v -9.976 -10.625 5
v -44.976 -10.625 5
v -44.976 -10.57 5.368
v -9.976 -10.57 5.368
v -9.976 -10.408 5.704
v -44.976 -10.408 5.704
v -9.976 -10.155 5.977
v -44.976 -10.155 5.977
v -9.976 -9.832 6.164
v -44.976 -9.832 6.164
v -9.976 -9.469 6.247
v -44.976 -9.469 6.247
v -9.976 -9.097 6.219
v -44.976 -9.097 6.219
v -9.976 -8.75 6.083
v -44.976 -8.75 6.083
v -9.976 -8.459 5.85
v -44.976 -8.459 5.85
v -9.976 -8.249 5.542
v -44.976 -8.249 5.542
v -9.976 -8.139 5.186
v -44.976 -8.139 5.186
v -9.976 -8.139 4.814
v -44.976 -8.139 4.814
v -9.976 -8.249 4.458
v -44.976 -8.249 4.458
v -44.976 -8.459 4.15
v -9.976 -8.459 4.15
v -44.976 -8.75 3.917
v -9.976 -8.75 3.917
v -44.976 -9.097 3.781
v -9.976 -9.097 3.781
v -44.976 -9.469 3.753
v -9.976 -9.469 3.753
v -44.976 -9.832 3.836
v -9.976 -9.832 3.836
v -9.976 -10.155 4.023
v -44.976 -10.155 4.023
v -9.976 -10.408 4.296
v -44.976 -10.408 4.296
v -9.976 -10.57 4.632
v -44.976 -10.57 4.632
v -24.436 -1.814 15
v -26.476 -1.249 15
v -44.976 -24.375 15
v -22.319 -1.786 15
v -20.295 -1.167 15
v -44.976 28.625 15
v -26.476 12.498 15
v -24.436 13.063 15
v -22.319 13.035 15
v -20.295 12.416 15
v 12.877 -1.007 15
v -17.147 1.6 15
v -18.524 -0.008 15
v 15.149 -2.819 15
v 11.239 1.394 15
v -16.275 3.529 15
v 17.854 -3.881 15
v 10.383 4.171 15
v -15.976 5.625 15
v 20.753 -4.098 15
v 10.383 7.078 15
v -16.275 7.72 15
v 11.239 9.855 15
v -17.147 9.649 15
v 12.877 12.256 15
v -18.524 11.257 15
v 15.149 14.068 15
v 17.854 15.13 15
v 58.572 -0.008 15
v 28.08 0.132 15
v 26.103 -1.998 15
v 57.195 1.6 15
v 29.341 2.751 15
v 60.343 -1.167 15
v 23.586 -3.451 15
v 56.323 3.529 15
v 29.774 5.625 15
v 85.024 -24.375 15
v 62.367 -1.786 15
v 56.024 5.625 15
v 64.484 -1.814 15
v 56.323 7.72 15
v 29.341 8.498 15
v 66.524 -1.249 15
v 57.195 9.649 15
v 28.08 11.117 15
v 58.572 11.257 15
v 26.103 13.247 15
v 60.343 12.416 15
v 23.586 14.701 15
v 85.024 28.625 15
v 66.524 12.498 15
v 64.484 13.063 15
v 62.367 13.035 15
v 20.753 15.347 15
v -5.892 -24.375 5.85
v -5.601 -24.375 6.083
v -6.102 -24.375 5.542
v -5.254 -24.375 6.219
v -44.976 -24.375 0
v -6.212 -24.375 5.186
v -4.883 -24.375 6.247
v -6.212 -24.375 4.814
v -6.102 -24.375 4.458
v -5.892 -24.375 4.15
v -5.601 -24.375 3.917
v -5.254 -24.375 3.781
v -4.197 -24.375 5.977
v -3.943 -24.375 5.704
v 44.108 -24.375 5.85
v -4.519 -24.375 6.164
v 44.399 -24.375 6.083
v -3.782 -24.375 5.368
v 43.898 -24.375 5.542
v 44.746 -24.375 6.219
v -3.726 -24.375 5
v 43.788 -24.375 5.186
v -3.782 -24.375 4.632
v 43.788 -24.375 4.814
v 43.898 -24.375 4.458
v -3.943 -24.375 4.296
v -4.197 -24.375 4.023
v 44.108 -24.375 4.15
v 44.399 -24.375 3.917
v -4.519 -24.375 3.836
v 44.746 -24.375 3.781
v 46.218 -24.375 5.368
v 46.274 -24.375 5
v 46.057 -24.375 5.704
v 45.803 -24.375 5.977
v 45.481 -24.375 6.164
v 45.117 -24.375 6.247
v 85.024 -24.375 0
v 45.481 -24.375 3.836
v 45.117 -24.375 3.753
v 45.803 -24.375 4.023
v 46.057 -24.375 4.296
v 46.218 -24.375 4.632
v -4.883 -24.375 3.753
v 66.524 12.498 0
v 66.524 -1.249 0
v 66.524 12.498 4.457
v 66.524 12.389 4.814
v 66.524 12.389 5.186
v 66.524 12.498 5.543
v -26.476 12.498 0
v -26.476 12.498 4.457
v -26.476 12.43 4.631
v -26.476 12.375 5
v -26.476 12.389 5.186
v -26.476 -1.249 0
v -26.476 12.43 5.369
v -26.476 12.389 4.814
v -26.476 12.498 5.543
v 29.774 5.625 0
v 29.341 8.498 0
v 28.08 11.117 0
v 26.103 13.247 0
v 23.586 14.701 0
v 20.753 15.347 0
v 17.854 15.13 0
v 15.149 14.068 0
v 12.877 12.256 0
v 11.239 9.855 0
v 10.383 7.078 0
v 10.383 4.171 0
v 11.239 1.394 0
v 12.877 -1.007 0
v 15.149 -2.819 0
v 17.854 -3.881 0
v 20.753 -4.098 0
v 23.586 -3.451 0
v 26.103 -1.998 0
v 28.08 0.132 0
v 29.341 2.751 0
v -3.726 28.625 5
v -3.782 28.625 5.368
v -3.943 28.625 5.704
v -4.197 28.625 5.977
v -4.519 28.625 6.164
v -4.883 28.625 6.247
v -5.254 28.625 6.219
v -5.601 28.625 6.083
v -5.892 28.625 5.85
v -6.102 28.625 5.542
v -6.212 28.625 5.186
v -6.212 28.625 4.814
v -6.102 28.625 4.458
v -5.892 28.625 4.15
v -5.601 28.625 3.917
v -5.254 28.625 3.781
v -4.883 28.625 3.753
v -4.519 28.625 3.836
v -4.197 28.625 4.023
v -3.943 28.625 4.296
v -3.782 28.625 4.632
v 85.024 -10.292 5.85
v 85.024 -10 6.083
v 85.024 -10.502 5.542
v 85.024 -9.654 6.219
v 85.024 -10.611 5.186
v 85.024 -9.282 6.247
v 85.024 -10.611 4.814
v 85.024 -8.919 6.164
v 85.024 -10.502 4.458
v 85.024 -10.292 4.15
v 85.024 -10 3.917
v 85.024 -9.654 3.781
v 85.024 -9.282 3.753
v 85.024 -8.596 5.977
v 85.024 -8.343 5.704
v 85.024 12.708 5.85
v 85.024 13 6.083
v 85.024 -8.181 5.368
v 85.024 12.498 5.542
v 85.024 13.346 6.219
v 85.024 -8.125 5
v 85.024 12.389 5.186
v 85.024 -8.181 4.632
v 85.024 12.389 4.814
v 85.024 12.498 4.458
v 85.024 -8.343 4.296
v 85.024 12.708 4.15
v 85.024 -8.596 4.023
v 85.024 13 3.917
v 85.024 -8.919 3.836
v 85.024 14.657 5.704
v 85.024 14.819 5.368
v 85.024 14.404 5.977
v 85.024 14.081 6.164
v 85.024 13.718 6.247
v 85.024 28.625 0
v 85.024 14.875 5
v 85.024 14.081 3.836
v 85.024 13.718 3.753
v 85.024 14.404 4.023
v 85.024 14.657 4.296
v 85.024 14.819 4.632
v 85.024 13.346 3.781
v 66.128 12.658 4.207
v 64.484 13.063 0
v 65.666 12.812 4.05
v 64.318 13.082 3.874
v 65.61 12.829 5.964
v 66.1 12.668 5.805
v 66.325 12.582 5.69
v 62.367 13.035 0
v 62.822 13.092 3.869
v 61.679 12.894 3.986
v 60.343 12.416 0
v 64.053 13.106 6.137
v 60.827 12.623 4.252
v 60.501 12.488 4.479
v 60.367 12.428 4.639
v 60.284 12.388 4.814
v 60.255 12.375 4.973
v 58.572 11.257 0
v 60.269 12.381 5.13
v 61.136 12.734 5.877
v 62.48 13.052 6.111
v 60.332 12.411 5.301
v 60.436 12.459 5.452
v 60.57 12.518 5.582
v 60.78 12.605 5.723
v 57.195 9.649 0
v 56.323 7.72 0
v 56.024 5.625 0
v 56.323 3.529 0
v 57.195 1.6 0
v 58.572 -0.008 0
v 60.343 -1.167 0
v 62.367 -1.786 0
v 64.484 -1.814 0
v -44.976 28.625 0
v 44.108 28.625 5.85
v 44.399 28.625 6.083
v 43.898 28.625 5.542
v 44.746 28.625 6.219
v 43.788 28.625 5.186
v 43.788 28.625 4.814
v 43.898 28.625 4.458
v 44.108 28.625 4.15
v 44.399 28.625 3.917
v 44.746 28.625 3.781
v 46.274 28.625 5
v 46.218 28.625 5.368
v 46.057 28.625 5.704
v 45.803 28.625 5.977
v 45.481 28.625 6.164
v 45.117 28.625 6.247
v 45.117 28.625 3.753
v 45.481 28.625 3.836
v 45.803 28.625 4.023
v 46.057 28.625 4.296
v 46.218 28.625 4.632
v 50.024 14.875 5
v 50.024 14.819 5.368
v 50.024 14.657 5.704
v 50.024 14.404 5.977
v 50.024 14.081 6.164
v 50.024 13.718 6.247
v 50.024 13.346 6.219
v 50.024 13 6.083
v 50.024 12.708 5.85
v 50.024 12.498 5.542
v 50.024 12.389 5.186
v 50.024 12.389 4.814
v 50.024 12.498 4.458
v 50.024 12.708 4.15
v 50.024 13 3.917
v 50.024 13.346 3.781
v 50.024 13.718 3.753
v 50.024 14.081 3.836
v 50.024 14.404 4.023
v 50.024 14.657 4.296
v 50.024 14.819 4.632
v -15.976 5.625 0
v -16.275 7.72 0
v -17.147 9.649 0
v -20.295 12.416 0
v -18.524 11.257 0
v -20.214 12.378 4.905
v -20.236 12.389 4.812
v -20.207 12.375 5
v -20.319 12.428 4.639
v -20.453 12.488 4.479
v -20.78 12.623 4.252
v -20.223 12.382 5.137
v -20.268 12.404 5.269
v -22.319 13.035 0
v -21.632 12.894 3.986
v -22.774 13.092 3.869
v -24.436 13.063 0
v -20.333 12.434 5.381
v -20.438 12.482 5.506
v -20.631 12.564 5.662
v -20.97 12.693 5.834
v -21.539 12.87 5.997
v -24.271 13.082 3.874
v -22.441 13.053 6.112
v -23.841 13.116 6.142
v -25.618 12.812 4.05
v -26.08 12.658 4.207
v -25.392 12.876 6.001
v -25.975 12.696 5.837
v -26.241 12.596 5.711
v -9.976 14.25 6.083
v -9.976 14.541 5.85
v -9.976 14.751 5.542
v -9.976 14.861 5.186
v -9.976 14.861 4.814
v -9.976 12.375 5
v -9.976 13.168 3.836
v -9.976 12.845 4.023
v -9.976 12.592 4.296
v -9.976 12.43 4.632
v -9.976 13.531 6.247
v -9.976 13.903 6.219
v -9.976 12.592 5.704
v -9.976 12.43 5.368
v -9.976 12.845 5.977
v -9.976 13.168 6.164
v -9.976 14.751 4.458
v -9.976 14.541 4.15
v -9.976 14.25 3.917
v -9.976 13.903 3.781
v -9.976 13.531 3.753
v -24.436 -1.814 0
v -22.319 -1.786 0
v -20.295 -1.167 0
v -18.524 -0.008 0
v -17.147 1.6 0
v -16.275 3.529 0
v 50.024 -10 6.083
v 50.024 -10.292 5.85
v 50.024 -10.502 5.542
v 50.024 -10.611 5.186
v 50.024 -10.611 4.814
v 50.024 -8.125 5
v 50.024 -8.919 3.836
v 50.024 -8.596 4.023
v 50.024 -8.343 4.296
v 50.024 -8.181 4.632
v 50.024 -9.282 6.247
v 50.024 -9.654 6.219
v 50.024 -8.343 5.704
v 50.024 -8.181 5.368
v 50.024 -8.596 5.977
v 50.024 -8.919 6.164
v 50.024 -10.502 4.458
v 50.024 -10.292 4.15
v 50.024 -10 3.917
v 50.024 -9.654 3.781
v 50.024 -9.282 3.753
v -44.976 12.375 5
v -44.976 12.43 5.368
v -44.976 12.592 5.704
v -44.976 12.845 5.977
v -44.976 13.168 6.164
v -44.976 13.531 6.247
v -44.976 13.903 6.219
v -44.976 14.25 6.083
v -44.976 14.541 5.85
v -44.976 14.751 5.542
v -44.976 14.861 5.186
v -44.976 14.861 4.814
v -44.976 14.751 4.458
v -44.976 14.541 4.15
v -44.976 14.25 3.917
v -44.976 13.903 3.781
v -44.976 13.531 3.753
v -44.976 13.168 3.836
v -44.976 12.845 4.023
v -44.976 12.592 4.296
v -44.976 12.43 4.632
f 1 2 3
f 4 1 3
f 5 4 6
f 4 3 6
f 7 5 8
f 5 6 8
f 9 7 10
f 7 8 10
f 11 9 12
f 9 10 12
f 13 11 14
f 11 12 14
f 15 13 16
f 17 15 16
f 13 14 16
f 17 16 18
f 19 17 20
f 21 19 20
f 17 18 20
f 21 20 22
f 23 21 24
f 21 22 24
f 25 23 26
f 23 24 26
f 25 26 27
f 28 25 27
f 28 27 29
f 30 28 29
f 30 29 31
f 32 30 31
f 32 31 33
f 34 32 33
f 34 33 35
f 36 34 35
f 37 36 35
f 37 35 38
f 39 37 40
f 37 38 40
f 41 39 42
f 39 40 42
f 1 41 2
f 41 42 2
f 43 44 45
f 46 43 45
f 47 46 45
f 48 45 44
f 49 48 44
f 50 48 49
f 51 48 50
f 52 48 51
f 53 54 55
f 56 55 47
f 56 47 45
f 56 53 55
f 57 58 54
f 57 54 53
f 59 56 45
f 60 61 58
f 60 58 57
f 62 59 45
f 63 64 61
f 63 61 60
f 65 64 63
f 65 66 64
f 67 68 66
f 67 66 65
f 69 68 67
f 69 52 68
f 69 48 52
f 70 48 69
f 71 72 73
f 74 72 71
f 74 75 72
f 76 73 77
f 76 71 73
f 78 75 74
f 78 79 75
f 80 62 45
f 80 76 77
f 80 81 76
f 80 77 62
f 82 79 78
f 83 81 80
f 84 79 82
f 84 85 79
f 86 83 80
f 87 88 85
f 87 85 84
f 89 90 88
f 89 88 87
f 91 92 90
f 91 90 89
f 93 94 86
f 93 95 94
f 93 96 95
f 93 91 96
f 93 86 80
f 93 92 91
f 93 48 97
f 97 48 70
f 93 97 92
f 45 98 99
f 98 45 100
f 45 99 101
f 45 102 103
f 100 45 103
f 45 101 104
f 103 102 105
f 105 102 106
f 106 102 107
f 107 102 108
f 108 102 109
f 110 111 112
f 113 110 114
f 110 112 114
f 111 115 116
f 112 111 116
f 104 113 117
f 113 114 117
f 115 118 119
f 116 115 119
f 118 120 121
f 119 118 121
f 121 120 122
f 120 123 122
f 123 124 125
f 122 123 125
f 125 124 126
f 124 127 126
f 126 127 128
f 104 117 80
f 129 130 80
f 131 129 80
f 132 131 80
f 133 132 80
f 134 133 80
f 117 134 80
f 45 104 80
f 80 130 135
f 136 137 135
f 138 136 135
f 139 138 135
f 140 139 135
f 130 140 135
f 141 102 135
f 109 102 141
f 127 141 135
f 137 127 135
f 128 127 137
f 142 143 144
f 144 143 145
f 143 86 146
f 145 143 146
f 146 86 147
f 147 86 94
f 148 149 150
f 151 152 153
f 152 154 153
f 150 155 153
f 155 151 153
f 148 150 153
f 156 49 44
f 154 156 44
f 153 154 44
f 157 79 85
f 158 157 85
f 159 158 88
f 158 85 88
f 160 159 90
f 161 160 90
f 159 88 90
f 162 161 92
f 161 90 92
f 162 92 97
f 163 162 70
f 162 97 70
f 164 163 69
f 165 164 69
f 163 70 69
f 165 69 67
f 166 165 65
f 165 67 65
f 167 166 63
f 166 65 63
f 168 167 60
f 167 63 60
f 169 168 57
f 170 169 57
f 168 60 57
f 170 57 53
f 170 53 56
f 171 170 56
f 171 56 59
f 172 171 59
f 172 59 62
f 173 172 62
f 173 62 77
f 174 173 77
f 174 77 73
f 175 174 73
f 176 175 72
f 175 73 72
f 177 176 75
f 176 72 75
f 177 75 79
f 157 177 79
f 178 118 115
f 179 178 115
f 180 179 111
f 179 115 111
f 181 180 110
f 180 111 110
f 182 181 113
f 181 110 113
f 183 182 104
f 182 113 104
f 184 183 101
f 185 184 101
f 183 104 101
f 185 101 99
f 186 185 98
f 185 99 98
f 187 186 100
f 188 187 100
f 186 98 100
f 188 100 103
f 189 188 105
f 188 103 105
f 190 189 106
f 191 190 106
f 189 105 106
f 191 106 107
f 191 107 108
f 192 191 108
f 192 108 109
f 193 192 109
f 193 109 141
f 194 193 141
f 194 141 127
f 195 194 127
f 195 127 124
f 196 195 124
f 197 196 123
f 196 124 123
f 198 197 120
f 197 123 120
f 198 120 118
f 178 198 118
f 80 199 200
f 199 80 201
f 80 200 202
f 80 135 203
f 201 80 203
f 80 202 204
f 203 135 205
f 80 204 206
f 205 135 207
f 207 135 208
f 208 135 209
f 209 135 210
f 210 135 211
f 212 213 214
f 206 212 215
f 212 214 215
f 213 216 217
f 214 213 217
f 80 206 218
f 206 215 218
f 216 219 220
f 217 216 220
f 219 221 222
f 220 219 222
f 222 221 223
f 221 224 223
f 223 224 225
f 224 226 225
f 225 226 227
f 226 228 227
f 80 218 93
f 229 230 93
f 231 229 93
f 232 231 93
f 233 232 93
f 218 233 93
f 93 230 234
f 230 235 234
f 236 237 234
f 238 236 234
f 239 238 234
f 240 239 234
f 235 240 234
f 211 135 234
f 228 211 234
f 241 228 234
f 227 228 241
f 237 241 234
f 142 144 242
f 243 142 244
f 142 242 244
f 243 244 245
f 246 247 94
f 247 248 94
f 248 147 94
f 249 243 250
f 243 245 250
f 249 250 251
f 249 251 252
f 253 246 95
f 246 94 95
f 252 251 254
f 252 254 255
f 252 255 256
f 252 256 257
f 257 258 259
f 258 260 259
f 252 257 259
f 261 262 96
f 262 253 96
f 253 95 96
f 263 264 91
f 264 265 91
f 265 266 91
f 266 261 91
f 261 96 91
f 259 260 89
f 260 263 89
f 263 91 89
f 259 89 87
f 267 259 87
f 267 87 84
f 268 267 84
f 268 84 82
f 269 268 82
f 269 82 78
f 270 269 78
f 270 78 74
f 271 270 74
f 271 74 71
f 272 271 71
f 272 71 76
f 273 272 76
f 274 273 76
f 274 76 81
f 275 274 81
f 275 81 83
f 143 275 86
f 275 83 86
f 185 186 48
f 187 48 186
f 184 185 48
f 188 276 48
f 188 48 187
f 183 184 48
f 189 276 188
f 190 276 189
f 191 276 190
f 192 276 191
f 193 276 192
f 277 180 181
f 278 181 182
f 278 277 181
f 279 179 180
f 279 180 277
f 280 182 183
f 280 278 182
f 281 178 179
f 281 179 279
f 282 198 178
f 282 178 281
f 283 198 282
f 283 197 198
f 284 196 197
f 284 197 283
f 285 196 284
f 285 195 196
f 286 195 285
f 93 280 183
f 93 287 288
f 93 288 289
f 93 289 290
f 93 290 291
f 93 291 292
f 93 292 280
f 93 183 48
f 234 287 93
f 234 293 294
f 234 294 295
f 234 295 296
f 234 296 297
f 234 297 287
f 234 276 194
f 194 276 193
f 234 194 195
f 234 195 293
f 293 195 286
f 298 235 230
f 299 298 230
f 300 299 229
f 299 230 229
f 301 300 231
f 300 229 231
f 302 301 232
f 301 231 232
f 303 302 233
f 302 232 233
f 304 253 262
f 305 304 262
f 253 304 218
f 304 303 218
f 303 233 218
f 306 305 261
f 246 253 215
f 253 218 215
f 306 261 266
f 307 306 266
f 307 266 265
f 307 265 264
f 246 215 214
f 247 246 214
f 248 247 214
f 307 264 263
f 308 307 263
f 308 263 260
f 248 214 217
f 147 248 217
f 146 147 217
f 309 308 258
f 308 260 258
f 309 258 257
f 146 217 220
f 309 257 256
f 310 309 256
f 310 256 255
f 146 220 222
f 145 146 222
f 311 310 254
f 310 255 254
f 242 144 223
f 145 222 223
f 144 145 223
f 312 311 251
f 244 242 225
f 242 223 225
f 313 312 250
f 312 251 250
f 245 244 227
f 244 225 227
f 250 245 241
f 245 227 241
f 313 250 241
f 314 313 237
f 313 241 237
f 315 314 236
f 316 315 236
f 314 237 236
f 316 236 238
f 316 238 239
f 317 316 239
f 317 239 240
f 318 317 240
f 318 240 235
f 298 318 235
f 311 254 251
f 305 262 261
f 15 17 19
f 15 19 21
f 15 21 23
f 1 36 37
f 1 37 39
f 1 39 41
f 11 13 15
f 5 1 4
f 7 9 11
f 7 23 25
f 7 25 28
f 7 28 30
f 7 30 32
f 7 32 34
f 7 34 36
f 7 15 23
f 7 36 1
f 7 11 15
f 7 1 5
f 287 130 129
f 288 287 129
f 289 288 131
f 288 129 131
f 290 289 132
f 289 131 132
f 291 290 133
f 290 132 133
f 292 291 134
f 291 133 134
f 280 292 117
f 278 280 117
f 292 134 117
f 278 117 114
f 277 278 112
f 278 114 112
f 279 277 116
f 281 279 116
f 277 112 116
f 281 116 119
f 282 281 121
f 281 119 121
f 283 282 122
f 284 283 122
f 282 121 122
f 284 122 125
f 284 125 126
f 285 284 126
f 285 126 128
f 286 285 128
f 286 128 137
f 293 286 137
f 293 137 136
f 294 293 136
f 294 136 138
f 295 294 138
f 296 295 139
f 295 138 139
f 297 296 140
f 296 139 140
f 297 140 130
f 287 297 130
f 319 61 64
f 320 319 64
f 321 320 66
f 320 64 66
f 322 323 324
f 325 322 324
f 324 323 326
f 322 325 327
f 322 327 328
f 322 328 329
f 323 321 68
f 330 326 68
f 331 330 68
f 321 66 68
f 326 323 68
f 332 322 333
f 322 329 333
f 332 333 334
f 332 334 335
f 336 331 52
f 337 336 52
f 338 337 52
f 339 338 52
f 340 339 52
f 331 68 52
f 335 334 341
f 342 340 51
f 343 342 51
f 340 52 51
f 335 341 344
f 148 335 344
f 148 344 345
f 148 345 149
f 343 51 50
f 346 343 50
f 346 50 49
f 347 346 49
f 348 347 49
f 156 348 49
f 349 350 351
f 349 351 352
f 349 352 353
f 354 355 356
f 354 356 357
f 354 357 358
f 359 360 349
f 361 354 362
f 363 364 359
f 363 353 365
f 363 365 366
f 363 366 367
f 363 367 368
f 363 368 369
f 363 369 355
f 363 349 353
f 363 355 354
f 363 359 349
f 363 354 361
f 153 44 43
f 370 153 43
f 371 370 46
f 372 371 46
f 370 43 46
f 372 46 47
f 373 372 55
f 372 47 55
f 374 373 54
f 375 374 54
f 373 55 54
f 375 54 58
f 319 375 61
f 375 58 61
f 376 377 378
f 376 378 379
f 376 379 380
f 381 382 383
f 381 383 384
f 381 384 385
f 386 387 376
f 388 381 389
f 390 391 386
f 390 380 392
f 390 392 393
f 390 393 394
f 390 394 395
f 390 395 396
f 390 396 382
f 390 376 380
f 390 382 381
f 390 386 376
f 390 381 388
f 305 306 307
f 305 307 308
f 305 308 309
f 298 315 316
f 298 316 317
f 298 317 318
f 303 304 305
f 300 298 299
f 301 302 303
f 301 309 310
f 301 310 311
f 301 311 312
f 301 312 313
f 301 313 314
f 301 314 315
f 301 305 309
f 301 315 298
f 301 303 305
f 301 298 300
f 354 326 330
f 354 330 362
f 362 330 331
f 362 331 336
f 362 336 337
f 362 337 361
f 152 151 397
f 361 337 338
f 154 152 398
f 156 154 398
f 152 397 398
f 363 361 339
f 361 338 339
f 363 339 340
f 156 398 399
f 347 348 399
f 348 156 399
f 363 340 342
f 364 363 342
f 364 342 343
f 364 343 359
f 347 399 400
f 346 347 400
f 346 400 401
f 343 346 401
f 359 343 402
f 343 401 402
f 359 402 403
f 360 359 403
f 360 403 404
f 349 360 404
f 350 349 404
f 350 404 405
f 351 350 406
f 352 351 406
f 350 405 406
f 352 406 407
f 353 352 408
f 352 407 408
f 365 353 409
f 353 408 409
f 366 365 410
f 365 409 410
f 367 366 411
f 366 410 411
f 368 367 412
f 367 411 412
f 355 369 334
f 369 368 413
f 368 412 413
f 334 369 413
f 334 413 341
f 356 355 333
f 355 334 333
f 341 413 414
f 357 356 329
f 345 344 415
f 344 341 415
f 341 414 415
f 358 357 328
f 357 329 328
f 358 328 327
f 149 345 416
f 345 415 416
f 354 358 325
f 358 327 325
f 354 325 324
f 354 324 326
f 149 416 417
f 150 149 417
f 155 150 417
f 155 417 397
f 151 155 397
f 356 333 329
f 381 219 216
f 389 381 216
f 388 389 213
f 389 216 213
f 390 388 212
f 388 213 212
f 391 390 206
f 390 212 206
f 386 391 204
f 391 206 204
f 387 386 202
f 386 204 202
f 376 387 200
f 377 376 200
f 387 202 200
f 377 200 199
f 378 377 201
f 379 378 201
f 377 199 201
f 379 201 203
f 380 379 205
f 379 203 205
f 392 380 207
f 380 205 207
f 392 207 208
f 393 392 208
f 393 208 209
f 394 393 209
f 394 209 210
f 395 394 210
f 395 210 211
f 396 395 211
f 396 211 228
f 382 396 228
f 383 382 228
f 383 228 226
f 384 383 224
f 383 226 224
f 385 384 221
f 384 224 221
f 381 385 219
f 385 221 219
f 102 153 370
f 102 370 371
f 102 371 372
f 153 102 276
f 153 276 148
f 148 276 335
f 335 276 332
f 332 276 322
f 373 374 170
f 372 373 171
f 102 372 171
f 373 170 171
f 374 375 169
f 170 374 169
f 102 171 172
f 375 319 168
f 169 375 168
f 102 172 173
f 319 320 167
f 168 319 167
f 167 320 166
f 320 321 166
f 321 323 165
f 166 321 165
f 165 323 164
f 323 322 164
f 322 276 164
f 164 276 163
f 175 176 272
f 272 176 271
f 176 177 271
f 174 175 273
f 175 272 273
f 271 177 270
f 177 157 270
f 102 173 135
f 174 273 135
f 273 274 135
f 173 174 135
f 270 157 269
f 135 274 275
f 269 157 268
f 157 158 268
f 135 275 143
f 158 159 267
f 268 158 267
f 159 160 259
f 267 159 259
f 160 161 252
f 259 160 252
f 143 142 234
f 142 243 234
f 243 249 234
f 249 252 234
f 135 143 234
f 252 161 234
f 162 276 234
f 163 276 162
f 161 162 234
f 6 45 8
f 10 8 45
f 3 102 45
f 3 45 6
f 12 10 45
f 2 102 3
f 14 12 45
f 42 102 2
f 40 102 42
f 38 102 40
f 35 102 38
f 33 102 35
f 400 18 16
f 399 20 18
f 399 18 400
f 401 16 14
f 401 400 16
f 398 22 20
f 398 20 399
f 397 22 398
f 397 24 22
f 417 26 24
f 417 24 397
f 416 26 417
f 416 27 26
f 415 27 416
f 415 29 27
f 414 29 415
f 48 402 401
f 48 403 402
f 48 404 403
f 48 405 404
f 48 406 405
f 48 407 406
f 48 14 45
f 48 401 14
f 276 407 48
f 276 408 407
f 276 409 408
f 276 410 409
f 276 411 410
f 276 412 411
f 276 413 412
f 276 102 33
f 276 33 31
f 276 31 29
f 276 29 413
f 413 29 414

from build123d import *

# Parameters (mm, degrees)
F0_W      = 130
F0_H      = 53
F1_DEPTH  = 15
F2_R      = 1.25
F5_DEPTH  = 35
F3_R      = 1.25
F6_DEPTH  = 53
F4_R      = 1.25
F7_DEPTH  = 35
F9_DEPTH  = 15
F10_R     = 9.75
F11_DEPTH = 15


with BuildPart() as f1:
    # F0 (on Top) → F1 (new body)
    with BuildSketch(Plane.XY):
        with Locations((20.023906, 2.124549)):
            Rectangle(F0_W, F0_H)
    extrude(amount=F1_DEPTH)

    # F2 (on face) → F5 (cut)
    with BuildSketch(Plane.YZ.offset(85.023906)):
        with Locations((-9.375451, 5)):
            Circle(F2_R)
        with Locations((13.624549, 5)):
            Circle(F2_R)
    extrude(amount=-F5_DEPTH, mode=Mode.SUBTRACT)

    # F3 (on face) → F6 (cut, through all)
    with BuildSketch(Plane.XZ.offset(24.375451)):
        with Locations((-4.976094, 5)):
            Circle(F3_R)
        with Locations((45.023906, 5)):
            Circle(F3_R)
    extrude(amount=-F6_DEPTH, mode=Mode.SUBTRACT)

    # F4 (on face) → F7 (cut)
    with BuildSketch(Plane(origin=(-44.976094, 0, 0), x_dir=(0, -1, 0), z_dir=(-1, 0, 0))):
        with Locations((-13.624549, 5)):
            Circle(F4_R)
        with Locations((9.375451, 5)):
            Circle(F4_R)
    extrude(amount=-F7_DEPTH, mode=Mode.SUBTRACT)

    # F8 (on face) → F9 (cut, through all)
    with BuildSketch(Plane.XY.offset(15)):
        with BuildLine():
            Line((66.523906, -1.249315), (66.523906, 12.498412))
            ThreePointArc((66.523906, 12.498412), (56.023906, 5.624549), (66.523906, -1.249315))
        make_face()
        with BuildLine():
            ThreePointArc((-26.476094, -1.249315), (-19.368175, -0.650401), (-15.976094, 5.624549))
            ThreePointArc((-15.976094, 5.624549), (-19.368175, 11.899499), (-26.476094, 12.498412))
            Line((-26.476094, 12.498412), (-26.476094, -1.249315))
        make_face()
    extrude(amount=-F9_DEPTH, mode=Mode.SUBTRACT)

    # F10 (on face) → F11 (cut, through all)
    with BuildSketch(Plane.XY.offset(15)):
        with Locations((20.023906, 5.624549)):
            Circle(F10_R)
    extrude(amount=-F11_DEPTH, mode=Mode.SUBTRACT)


solid = f1.part
